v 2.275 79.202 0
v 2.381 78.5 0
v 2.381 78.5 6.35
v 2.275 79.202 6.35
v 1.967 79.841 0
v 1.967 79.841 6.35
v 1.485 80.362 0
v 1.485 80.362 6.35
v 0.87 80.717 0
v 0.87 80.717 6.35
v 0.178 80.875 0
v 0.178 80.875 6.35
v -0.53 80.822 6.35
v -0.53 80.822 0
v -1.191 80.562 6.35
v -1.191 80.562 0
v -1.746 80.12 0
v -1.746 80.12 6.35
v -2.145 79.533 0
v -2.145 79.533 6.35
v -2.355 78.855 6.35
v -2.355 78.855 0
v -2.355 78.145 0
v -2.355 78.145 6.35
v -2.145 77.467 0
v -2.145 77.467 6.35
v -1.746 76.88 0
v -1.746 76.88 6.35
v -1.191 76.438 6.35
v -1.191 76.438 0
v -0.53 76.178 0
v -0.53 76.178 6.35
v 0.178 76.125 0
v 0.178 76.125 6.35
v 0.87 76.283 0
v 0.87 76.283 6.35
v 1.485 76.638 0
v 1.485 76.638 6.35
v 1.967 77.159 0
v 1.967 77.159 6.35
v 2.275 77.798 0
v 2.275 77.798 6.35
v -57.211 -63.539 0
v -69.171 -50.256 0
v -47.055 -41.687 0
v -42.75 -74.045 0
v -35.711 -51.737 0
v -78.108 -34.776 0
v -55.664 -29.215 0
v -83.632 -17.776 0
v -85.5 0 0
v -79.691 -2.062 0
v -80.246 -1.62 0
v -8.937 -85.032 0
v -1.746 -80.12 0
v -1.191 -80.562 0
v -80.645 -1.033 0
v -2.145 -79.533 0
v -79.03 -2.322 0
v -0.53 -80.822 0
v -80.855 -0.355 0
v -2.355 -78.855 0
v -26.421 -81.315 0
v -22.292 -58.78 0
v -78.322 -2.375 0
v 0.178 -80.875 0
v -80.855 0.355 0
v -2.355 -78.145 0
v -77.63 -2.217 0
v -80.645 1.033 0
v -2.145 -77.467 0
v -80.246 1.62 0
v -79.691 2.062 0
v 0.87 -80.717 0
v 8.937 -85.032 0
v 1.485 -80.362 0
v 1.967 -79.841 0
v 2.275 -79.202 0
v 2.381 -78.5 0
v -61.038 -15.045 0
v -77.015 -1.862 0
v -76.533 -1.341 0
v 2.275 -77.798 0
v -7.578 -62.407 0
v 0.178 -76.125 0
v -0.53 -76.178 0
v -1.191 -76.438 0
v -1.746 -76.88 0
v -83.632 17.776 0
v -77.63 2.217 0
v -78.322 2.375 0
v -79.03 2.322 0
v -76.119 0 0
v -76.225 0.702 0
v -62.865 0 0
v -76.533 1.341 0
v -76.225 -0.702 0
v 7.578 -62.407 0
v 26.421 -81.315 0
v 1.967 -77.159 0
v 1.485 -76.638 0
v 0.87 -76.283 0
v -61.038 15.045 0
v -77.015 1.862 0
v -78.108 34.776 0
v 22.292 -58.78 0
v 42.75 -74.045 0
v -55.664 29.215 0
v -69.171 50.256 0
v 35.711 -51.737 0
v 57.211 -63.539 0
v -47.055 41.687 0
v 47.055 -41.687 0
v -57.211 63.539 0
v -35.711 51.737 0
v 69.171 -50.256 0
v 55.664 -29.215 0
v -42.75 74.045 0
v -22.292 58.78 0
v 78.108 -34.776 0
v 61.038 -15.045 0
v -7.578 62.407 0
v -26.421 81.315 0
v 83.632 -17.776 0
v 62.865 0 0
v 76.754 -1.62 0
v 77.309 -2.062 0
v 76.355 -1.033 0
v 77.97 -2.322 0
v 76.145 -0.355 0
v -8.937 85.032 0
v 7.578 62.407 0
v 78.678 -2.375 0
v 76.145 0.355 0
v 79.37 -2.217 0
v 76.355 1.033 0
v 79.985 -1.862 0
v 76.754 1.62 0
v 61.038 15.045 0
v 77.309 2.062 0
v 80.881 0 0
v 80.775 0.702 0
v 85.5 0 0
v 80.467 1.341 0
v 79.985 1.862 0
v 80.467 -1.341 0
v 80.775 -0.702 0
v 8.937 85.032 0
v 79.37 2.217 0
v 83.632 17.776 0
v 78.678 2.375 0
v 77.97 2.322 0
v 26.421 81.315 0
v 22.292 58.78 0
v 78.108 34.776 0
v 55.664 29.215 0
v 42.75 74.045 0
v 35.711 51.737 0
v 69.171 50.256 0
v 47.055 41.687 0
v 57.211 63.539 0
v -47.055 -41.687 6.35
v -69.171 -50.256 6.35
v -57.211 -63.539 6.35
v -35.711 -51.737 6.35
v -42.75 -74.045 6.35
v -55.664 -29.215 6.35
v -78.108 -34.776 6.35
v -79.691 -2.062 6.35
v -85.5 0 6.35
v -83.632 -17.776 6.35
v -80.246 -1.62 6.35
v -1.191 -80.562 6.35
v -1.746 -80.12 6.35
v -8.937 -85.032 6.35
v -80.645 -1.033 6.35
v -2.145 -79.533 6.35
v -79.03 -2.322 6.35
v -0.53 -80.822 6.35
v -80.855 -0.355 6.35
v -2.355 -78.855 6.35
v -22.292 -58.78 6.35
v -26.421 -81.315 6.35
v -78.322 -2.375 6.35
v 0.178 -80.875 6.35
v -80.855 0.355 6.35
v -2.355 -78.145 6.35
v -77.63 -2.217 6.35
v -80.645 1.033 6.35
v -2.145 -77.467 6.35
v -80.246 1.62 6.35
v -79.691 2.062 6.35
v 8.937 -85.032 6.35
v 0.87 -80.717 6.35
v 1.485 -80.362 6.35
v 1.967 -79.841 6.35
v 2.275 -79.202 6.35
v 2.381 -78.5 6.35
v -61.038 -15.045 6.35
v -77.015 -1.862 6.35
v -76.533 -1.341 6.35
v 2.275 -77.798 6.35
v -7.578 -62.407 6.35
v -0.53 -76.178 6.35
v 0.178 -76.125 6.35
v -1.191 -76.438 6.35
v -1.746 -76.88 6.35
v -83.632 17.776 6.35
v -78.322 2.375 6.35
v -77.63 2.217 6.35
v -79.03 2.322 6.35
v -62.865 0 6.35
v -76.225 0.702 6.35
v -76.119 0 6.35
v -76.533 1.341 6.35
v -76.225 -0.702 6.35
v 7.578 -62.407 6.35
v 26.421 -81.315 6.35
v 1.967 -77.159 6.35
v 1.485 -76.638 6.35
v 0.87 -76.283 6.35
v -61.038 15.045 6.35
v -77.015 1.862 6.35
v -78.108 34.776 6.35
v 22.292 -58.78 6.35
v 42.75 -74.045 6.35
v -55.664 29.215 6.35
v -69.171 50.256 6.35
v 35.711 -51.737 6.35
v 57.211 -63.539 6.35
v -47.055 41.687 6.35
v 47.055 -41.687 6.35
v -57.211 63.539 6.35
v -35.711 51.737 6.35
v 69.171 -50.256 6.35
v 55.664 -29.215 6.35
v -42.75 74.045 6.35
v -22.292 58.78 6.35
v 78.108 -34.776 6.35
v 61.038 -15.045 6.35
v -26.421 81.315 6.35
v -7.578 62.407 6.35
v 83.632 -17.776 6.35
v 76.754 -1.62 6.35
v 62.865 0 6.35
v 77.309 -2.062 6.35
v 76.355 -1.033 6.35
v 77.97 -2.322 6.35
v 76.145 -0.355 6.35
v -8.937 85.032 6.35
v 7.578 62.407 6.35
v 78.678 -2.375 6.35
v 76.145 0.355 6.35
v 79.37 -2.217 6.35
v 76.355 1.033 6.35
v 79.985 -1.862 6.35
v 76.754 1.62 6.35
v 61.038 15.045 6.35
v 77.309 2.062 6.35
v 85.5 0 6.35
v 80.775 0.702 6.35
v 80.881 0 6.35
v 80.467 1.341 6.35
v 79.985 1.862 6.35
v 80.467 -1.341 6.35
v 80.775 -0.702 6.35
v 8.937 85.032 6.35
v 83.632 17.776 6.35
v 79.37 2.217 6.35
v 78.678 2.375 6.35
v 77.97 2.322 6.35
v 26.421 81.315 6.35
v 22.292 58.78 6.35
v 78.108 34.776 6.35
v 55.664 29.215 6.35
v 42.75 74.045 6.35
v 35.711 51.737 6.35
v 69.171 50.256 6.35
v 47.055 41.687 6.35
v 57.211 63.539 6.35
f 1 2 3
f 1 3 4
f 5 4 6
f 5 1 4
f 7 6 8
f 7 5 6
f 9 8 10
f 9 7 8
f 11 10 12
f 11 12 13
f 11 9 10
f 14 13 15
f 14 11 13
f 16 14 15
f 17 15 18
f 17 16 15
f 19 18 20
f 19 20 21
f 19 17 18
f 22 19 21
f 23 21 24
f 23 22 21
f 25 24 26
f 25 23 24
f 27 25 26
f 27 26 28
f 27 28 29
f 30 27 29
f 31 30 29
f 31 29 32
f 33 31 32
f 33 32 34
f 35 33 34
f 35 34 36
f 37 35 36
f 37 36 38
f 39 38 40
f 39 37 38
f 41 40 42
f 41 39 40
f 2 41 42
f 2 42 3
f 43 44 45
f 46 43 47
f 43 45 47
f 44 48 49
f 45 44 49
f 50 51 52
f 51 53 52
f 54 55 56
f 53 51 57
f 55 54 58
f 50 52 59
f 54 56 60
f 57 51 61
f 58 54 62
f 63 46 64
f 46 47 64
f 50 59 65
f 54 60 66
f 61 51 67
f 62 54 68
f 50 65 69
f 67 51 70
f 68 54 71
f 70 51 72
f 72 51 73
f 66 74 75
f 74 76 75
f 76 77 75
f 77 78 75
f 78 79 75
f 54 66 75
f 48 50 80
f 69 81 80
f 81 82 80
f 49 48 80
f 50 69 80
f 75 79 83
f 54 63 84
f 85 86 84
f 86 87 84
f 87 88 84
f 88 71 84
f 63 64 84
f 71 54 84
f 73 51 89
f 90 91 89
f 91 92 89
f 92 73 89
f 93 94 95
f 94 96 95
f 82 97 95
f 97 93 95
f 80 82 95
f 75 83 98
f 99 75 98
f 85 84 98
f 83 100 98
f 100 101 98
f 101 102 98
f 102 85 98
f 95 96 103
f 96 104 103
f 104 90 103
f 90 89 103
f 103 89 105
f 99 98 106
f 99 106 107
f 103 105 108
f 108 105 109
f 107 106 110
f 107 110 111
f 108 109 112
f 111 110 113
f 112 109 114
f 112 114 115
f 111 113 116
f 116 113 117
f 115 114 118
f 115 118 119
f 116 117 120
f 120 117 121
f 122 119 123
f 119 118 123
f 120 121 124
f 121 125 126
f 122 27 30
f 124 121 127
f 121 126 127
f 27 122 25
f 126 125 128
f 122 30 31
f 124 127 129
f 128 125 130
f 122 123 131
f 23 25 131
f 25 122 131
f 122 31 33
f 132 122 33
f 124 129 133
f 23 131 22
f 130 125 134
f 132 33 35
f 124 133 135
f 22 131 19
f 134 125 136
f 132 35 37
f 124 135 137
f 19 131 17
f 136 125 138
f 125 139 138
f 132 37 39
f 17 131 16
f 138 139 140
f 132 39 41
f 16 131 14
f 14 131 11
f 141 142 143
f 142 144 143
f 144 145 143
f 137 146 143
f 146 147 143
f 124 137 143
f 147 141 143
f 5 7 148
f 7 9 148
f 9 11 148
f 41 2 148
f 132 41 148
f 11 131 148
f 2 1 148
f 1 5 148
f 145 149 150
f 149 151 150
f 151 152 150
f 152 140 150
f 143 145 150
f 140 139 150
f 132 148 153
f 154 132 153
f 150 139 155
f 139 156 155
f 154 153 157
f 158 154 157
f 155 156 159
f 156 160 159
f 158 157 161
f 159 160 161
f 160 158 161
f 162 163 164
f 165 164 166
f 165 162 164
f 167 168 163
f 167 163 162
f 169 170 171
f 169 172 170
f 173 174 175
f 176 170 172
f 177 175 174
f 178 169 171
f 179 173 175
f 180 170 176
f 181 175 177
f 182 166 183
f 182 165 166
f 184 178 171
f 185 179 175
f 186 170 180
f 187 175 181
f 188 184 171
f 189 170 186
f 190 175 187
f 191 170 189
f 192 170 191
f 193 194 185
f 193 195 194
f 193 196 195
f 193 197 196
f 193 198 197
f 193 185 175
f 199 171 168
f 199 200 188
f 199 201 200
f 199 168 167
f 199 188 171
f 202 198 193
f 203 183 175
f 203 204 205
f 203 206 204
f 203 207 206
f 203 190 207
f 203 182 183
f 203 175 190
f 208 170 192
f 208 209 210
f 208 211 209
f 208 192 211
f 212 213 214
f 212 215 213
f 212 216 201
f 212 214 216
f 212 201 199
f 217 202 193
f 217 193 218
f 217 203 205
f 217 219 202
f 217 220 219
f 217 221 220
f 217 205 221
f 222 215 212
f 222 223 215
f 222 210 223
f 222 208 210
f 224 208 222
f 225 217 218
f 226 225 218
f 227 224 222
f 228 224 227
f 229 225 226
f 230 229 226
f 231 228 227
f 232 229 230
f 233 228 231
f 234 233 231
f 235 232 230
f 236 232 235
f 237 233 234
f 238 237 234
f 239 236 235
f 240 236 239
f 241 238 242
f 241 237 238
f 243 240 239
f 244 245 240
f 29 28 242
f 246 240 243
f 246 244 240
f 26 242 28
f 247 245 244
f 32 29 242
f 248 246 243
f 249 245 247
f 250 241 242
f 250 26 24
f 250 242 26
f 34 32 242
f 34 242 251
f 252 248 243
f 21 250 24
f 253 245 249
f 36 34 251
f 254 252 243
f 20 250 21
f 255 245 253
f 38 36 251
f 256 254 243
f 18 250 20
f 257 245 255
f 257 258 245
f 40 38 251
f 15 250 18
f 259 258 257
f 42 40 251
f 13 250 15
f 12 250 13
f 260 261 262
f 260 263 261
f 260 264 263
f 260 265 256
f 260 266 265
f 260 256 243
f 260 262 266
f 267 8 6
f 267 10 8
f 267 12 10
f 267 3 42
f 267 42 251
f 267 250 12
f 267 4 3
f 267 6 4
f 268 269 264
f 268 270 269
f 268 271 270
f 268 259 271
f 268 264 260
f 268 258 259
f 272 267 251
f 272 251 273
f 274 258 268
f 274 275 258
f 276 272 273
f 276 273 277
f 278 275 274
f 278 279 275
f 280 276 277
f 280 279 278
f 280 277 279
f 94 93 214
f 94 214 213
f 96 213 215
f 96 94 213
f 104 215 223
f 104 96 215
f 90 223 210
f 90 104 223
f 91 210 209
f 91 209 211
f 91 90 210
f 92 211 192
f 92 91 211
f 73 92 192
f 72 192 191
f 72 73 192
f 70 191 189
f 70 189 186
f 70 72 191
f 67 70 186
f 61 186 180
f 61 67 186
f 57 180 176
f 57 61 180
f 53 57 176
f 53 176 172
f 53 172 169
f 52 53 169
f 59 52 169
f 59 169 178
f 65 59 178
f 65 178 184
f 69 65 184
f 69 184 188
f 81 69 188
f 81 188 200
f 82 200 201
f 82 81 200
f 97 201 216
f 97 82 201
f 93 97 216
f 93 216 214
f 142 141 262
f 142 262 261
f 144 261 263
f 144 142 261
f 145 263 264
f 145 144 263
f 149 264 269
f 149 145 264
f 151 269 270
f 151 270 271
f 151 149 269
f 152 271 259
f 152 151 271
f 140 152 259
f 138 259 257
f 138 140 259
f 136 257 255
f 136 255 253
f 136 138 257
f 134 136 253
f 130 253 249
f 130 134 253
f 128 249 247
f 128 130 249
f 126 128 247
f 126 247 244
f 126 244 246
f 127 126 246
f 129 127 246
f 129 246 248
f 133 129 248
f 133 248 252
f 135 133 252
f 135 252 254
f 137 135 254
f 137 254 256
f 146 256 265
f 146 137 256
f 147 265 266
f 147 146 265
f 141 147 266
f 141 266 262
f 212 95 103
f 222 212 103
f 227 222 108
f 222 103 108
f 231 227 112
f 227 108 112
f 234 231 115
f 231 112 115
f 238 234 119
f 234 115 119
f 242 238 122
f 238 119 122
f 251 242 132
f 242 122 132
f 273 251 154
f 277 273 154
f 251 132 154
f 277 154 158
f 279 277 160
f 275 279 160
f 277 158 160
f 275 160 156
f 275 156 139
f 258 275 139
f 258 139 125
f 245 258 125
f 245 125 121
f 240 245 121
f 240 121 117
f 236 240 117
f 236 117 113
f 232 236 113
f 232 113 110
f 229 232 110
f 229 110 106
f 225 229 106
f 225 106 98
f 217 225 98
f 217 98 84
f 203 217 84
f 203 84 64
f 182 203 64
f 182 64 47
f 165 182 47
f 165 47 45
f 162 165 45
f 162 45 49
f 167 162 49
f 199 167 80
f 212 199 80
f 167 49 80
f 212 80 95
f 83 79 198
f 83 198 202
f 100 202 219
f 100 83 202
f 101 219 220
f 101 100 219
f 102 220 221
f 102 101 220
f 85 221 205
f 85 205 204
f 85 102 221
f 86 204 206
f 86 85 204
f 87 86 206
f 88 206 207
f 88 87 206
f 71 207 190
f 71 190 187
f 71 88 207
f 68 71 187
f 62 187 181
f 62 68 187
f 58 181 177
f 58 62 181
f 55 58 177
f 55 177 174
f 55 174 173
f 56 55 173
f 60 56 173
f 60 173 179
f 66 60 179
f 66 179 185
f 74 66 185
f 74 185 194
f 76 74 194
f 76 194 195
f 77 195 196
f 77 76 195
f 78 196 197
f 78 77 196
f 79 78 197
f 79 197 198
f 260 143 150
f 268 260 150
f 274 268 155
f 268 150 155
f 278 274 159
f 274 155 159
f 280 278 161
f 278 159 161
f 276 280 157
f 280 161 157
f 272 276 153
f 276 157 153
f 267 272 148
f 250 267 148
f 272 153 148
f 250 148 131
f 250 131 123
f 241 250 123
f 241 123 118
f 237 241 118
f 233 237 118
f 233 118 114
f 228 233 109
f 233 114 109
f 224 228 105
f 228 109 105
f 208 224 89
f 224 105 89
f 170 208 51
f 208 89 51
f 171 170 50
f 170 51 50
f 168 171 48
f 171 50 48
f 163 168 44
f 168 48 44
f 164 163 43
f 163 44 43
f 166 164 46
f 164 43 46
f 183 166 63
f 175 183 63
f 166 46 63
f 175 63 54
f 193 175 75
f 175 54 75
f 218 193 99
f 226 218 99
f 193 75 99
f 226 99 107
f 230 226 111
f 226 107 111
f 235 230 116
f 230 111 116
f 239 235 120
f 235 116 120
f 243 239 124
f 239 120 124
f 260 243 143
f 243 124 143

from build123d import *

# Parameters (mm, degrees)
SKETCH1_R           = 85.5
SKETCH1_R_2         = 2.38125
BOSS_EXTRUDE1_DEPTH = 6.35
SKETCH6_R           = 62.865
CUT_EXTRUDE3_DEPTH  = 122.081883451


with BuildPart() as part:
    # Sketch1 → Boss-Extrude1 (new body)
    with BuildSketch(Plane.XY):
        Circle(SKETCH1_R)
        with Locations((0, 78.499999972)):
            Circle(SKETCH1_R_2, mode=Mode.SUBTRACT)
        with Locations((78.5, 0)):
            Circle(SKETCH1_R_2, mode=Mode.SUBTRACT)
        with Locations((2.8e-08, -78.5)):
            Circle(SKETCH1_R_2, mode=Mode.SUBTRACT)
        with Locations((-78.499999972, -2.8e-08)):
            Circle(SKETCH1_R_2, mode=Mode.SUBTRACT)
    extrude(amount=BOSS_EXTRUDE1_DEPTH)

    # Sketch6 → Cut-Extrude3 (cut, through all)
    with BuildSketch(Plane(origin=(0, 0, 0), x_dir=(-1, 0, 0), z_dir=(0, 0, -1))):
        Circle(SKETCH6_R)
    extrude(amount=-CUT_EXTRUDE3_DEPTH, mode=Mode.SUBTRACT)


solid = part.part
